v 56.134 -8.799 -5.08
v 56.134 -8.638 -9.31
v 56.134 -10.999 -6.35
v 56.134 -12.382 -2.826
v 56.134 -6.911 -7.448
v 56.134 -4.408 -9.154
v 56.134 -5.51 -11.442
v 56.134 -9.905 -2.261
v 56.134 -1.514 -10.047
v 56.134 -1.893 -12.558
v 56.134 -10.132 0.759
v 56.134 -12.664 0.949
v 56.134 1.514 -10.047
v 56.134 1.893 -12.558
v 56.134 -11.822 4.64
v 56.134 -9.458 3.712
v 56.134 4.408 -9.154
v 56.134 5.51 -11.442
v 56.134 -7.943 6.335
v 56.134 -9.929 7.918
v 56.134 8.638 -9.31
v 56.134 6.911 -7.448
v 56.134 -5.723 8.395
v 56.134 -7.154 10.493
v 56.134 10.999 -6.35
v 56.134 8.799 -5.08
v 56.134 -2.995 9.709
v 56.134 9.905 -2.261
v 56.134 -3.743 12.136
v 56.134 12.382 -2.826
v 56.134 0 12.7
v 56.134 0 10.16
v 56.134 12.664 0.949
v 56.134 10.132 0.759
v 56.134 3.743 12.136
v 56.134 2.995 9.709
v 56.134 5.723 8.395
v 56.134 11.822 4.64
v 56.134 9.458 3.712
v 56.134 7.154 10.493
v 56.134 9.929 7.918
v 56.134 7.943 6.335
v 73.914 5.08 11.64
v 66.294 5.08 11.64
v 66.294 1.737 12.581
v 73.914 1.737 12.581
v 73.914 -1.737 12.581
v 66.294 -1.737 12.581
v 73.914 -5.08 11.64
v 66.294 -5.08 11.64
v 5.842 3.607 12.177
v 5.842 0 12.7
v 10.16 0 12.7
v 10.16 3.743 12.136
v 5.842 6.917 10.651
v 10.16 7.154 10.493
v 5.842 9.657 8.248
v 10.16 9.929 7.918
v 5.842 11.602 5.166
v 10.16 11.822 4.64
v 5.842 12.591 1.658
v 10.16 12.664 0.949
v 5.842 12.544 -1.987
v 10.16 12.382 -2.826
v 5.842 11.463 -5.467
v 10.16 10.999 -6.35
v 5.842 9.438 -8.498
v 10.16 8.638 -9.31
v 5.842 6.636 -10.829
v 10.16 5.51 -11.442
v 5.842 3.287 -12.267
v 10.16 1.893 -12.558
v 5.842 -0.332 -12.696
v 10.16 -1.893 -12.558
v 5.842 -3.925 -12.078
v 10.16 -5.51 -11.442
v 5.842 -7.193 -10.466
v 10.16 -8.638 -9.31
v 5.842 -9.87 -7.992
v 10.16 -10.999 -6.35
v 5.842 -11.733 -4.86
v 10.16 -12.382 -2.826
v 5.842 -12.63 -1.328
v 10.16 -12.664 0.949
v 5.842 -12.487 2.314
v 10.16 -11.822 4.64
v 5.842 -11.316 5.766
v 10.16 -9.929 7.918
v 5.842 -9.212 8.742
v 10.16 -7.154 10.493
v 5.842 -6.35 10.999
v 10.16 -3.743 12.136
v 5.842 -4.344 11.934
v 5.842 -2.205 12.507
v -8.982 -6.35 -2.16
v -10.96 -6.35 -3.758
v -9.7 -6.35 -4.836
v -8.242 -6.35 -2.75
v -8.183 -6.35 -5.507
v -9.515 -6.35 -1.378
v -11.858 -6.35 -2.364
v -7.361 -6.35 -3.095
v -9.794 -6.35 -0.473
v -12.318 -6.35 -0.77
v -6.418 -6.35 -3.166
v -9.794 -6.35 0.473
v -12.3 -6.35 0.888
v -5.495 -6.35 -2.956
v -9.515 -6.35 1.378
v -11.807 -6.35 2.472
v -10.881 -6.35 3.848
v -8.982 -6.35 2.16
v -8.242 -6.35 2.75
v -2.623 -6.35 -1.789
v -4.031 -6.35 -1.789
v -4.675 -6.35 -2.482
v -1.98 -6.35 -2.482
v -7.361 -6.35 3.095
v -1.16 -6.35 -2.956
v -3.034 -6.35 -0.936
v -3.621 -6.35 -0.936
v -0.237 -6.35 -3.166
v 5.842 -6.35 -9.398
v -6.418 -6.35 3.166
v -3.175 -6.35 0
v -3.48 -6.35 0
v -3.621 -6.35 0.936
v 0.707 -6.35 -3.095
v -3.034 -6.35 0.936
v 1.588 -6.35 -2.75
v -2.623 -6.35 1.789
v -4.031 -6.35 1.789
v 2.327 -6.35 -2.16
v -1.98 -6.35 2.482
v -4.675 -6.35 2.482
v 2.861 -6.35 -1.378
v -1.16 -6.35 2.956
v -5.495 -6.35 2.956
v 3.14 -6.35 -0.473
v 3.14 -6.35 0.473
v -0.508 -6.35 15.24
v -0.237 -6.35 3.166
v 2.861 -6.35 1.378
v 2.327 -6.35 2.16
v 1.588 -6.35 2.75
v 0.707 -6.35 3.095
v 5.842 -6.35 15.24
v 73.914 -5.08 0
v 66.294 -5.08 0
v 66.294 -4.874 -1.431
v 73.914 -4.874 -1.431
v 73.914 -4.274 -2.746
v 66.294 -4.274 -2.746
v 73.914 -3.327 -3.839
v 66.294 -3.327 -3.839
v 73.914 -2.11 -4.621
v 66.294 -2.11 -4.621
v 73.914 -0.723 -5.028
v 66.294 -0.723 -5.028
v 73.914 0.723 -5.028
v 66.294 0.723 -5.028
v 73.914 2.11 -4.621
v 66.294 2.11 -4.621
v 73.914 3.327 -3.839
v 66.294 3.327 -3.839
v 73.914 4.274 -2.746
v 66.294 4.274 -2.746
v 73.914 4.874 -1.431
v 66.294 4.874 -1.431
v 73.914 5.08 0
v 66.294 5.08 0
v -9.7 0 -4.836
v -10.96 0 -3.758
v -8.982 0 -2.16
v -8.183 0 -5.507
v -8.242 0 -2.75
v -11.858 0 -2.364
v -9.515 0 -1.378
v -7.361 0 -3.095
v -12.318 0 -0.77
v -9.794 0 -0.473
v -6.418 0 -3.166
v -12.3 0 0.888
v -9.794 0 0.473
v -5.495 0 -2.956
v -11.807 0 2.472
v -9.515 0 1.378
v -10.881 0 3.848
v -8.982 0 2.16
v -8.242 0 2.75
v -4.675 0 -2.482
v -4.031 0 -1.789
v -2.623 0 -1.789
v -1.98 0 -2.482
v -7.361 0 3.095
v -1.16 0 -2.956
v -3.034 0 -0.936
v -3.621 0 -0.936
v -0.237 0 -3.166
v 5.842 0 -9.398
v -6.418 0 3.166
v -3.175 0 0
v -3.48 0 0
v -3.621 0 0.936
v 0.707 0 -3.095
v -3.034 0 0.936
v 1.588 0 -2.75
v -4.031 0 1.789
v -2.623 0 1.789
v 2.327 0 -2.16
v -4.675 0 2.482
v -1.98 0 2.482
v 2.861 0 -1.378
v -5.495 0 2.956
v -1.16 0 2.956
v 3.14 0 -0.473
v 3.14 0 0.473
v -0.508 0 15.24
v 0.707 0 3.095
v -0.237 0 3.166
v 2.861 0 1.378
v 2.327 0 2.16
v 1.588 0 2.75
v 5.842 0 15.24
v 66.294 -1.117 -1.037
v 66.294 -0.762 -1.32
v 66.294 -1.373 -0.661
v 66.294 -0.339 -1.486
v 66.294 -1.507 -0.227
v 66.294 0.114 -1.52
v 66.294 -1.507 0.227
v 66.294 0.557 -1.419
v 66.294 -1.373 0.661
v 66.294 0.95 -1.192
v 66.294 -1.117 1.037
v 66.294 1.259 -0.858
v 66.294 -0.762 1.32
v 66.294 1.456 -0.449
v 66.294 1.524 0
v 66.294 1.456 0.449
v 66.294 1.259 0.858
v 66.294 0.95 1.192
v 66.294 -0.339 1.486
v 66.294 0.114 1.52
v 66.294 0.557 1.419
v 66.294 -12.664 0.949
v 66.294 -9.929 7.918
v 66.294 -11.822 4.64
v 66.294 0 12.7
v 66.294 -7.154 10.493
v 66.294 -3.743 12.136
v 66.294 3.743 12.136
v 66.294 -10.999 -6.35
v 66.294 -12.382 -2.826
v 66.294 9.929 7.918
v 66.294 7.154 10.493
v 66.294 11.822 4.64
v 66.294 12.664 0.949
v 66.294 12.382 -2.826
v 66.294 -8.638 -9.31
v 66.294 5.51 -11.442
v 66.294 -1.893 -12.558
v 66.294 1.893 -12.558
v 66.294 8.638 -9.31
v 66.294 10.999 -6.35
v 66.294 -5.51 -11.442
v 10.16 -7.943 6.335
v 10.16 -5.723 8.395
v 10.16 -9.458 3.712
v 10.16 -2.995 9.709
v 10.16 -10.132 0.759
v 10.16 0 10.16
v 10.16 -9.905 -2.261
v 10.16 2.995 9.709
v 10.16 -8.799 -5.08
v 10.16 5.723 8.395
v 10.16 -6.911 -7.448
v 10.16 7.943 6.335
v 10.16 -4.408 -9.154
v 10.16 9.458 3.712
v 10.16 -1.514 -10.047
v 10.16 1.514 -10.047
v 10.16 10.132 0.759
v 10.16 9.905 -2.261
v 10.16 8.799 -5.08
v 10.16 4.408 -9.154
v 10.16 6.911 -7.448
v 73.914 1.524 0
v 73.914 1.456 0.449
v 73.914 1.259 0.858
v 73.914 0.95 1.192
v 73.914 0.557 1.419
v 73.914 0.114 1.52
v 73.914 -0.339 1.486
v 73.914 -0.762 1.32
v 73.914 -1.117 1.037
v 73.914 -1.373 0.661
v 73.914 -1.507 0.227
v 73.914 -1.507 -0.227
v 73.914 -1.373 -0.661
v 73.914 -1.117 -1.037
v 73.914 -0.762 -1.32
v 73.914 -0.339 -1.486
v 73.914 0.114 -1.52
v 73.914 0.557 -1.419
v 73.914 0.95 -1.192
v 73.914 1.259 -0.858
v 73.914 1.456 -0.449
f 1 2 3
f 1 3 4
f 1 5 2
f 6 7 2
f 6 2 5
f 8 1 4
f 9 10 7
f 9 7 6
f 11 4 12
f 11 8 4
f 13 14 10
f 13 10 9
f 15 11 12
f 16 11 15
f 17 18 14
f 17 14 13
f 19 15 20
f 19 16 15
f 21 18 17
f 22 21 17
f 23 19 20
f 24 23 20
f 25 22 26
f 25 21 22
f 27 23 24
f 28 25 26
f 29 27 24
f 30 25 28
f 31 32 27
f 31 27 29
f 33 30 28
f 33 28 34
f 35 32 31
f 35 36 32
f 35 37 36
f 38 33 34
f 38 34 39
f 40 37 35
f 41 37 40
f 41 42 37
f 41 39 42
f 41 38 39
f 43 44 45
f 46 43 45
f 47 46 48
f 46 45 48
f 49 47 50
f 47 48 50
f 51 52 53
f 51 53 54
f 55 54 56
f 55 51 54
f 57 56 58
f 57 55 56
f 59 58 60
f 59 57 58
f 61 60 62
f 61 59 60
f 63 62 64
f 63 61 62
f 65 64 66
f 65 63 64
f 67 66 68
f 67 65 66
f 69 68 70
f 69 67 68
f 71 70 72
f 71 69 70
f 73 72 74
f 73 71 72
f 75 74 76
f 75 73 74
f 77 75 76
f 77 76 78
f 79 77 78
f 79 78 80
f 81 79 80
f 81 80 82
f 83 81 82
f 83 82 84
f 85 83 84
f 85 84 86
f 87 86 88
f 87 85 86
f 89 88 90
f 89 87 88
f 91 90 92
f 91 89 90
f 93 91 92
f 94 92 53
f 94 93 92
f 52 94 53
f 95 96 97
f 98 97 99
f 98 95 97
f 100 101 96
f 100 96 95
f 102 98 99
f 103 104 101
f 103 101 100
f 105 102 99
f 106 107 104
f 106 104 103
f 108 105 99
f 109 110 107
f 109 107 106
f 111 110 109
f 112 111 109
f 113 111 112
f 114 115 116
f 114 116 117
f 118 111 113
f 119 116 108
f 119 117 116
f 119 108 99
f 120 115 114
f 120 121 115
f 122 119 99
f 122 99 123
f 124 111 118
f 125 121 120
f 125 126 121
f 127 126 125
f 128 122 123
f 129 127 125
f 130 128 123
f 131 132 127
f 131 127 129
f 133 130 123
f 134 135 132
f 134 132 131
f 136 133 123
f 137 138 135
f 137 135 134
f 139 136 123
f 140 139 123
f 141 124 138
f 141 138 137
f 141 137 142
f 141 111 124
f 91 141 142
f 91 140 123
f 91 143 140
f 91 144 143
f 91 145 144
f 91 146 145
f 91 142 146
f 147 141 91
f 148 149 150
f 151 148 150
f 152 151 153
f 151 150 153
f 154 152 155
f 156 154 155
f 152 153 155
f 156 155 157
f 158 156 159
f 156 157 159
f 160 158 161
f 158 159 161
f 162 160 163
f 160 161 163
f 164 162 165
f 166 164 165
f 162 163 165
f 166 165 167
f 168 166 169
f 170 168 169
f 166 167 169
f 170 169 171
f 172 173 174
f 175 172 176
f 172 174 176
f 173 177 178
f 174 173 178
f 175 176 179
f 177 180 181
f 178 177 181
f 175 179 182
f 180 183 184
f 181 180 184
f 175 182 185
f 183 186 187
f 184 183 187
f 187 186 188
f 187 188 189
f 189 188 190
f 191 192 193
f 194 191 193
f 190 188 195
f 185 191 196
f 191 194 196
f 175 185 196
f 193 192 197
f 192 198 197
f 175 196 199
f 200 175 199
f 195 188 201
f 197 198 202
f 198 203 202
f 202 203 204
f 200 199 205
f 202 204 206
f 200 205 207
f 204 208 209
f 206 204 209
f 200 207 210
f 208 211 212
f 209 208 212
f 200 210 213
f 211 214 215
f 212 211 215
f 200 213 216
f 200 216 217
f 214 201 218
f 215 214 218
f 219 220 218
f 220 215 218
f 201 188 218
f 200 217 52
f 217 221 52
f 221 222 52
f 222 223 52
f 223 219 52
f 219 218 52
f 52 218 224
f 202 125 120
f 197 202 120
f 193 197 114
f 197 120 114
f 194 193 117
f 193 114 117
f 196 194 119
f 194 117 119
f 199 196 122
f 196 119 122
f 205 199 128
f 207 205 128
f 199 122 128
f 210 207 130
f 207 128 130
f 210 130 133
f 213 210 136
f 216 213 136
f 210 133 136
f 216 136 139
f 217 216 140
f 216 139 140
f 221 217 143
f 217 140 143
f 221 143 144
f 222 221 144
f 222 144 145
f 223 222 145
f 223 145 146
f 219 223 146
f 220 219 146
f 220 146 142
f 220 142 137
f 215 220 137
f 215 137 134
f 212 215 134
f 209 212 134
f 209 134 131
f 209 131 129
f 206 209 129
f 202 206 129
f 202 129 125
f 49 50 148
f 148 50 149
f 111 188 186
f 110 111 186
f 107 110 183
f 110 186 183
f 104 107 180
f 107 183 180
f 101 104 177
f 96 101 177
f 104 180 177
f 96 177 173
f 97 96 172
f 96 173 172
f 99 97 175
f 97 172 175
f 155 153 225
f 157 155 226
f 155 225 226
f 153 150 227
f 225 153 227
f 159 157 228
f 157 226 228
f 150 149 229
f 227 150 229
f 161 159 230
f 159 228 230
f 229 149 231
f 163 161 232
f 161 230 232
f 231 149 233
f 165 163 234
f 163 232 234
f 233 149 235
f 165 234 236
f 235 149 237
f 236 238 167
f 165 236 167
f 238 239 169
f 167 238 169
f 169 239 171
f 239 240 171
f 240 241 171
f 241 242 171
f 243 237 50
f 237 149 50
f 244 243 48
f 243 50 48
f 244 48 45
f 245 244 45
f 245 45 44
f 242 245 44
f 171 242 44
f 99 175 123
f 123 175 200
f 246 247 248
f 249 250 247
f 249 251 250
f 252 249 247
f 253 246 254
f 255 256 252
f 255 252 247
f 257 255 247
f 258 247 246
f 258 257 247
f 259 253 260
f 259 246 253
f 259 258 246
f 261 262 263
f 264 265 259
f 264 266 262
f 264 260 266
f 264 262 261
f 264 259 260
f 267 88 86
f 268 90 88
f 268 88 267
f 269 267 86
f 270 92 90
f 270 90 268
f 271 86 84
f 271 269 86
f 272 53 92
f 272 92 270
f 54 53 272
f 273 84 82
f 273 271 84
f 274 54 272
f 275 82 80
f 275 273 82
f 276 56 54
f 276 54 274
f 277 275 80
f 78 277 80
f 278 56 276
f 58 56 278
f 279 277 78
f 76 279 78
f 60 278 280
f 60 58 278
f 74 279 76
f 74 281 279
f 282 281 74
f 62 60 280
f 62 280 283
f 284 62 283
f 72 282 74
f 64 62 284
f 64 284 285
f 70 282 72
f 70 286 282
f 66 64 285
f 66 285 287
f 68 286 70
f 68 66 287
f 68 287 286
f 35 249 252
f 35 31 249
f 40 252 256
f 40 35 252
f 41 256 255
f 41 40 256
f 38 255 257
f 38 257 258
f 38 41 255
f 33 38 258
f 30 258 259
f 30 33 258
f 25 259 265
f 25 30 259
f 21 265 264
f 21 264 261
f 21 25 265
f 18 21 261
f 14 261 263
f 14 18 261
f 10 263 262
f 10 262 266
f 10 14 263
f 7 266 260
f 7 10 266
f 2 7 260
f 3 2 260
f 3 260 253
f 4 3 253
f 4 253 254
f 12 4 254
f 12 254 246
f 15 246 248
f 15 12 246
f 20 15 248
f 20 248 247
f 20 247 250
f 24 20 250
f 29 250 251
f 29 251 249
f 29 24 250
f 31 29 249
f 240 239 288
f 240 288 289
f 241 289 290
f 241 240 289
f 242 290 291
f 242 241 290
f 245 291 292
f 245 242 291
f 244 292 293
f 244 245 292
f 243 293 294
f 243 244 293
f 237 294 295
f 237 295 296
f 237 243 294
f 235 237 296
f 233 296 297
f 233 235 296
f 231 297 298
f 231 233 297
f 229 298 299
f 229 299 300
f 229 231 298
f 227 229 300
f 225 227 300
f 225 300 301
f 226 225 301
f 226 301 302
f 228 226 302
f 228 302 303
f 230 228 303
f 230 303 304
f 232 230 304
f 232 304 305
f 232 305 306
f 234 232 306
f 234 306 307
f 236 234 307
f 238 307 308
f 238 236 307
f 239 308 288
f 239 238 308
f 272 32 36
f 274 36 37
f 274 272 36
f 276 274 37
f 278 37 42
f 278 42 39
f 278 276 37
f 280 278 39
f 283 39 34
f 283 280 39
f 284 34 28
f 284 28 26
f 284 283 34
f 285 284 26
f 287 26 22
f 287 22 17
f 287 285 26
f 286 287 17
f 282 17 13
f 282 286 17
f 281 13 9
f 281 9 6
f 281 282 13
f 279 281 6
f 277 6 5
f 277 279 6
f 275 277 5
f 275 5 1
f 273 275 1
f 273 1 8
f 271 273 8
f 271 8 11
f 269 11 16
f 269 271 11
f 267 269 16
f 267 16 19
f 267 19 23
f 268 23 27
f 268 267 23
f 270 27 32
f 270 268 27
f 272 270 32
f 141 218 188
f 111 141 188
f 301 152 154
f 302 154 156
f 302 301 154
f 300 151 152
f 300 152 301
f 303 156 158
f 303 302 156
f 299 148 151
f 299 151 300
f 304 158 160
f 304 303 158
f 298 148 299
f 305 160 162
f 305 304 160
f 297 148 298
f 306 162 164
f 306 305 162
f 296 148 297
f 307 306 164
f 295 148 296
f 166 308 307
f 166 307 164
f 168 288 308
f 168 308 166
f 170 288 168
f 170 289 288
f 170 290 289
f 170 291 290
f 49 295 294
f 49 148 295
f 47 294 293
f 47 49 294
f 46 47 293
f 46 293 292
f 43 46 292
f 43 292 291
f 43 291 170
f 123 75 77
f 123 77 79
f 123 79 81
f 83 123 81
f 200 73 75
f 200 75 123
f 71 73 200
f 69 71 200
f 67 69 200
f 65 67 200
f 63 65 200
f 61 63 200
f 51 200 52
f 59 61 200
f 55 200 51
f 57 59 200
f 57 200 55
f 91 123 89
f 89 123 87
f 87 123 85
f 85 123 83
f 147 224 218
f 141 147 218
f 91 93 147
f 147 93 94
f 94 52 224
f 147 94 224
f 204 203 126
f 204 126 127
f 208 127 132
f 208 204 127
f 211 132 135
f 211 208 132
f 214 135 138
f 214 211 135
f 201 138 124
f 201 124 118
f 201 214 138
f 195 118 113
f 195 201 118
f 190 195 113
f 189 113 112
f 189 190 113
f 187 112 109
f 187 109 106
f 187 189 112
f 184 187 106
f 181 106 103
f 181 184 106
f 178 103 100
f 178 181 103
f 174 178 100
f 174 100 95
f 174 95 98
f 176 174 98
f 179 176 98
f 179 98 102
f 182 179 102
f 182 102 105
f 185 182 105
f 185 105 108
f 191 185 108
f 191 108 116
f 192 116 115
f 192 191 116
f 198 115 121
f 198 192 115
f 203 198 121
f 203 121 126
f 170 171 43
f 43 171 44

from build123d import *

# Parameters (mm, degrees)
F0_R     = 3.175
F0_W     = 5.842
F0_H     = 12.7
F2_DEPTH = 6.35
F3_R     = 1.524
F4_DEPTH = 7.62
F5_D     = 6.35


with BuildPart() as f1:
    # F0 (on Front) → F1 (revolve)
    with BuildSketch(Plane.XZ):
        Polygon((5.842, 12.7), (5.842, 0), (66.294, 0), (66.294, 12.7), (56.134, 12.7), (56.134, 10.16), (10.16, 10.16), (10.16, 12.7), align=None)
    revolve(axis=Axis((33.147, 0, 0), (-1, 0, 0)))

    # F0 (on Front) → F2 (join)
    with BuildSketch(Plane.XZ):
        with BuildLine():
            Line((-0.9398, 0), (0, 0))
            Line((0, 0), (0, 12.7))
            Line((0, 12.7), (5.842, 12.7))
            Line((5.842, 12.7), (5.842, 15.24))
            Line((5.842, 15.24), (-0.508, 15.24))
            Line((-0.508, 15.24), (-10.8806298187, 3.8475430269))
            ThreePointArc((-10.8806298187, 3.8475430269), (-4.5919612295, 5.3297205562), (-0.9398, 0))
        make_face()
        with BuildLine():
            Line((5.842, 0), (0, 0))
            Line((0, 0), (-0.9398, 0))
            ThreePointArc((-0.9398, 0), (-3.1957909266, -4.5493385486), (-8.1826630726, -5.5069827884))
            Line((-8.1826630726, -5.5069827884), (5.842, -9.398))
            Line((5.842, -9.398), (5.842, 0))
        make_face()
        with BuildLine():
            ThreePointArc((-8.1826630726, -5.5069827884), (-3.1957909266, -4.5493385486), (-0.9398, 0))
            ThreePointArc((-0.9398, 0), (-4.5919612295, 5.3297205562), (-10.8806298187, 3.8475430269))
            ThreePointArc((-10.8806298187, 3.8475430269), (-12.1459778134, -1.5837270034), (-8.1826630726, -5.5069827884))
        make_face()
        with Locations((-6.6548, 0)):
            Circle(F0_R, mode=Mode.SUBTRACT)
        with Locations((2.921, 6.35)):
            Rectangle(F0_W, F0_H)
    extrude(amount=F2_DEPTH)

    # F5 (through all)
    with Locations(Plane(origin=(0, 0, 0), x_dir=(1, 0, 0), z_dir=(0, 1, 0))):
        with Locations((0, 0)):
            Hole(F5_D / 2)


with BuildPart() as f4:
    # F3 (on face) → F4 (new body)
    with BuildSketch(Plane.YZ.offset(66.294)):
        with BuildLine():
            ThreePointArc((-5.08, 0), (0, -5.08), (5.08, 0))
            ThreePointArc((5.08, 0), (0, 5.08), (-5.08, 0))
        make_face()
        Circle(F3_R, mode=Mode.SUBTRACT)
        with BuildLine():
            ThreePointArc((-5.08, 0), (0, 5.08), (5.08, 0))
            Line((5.08, 0), (5.08, 11.6397422652))
            ThreePointArc((5.08, 11.6397422652), (0, 12.7), (-5.08, 11.6397422652))
            Line((-5.08, 11.6397422652), (-5.08, 0))
        make_face()
    extrude(amount=F4_DEPTH)


solid = Compound([f1.part, f4.part])
